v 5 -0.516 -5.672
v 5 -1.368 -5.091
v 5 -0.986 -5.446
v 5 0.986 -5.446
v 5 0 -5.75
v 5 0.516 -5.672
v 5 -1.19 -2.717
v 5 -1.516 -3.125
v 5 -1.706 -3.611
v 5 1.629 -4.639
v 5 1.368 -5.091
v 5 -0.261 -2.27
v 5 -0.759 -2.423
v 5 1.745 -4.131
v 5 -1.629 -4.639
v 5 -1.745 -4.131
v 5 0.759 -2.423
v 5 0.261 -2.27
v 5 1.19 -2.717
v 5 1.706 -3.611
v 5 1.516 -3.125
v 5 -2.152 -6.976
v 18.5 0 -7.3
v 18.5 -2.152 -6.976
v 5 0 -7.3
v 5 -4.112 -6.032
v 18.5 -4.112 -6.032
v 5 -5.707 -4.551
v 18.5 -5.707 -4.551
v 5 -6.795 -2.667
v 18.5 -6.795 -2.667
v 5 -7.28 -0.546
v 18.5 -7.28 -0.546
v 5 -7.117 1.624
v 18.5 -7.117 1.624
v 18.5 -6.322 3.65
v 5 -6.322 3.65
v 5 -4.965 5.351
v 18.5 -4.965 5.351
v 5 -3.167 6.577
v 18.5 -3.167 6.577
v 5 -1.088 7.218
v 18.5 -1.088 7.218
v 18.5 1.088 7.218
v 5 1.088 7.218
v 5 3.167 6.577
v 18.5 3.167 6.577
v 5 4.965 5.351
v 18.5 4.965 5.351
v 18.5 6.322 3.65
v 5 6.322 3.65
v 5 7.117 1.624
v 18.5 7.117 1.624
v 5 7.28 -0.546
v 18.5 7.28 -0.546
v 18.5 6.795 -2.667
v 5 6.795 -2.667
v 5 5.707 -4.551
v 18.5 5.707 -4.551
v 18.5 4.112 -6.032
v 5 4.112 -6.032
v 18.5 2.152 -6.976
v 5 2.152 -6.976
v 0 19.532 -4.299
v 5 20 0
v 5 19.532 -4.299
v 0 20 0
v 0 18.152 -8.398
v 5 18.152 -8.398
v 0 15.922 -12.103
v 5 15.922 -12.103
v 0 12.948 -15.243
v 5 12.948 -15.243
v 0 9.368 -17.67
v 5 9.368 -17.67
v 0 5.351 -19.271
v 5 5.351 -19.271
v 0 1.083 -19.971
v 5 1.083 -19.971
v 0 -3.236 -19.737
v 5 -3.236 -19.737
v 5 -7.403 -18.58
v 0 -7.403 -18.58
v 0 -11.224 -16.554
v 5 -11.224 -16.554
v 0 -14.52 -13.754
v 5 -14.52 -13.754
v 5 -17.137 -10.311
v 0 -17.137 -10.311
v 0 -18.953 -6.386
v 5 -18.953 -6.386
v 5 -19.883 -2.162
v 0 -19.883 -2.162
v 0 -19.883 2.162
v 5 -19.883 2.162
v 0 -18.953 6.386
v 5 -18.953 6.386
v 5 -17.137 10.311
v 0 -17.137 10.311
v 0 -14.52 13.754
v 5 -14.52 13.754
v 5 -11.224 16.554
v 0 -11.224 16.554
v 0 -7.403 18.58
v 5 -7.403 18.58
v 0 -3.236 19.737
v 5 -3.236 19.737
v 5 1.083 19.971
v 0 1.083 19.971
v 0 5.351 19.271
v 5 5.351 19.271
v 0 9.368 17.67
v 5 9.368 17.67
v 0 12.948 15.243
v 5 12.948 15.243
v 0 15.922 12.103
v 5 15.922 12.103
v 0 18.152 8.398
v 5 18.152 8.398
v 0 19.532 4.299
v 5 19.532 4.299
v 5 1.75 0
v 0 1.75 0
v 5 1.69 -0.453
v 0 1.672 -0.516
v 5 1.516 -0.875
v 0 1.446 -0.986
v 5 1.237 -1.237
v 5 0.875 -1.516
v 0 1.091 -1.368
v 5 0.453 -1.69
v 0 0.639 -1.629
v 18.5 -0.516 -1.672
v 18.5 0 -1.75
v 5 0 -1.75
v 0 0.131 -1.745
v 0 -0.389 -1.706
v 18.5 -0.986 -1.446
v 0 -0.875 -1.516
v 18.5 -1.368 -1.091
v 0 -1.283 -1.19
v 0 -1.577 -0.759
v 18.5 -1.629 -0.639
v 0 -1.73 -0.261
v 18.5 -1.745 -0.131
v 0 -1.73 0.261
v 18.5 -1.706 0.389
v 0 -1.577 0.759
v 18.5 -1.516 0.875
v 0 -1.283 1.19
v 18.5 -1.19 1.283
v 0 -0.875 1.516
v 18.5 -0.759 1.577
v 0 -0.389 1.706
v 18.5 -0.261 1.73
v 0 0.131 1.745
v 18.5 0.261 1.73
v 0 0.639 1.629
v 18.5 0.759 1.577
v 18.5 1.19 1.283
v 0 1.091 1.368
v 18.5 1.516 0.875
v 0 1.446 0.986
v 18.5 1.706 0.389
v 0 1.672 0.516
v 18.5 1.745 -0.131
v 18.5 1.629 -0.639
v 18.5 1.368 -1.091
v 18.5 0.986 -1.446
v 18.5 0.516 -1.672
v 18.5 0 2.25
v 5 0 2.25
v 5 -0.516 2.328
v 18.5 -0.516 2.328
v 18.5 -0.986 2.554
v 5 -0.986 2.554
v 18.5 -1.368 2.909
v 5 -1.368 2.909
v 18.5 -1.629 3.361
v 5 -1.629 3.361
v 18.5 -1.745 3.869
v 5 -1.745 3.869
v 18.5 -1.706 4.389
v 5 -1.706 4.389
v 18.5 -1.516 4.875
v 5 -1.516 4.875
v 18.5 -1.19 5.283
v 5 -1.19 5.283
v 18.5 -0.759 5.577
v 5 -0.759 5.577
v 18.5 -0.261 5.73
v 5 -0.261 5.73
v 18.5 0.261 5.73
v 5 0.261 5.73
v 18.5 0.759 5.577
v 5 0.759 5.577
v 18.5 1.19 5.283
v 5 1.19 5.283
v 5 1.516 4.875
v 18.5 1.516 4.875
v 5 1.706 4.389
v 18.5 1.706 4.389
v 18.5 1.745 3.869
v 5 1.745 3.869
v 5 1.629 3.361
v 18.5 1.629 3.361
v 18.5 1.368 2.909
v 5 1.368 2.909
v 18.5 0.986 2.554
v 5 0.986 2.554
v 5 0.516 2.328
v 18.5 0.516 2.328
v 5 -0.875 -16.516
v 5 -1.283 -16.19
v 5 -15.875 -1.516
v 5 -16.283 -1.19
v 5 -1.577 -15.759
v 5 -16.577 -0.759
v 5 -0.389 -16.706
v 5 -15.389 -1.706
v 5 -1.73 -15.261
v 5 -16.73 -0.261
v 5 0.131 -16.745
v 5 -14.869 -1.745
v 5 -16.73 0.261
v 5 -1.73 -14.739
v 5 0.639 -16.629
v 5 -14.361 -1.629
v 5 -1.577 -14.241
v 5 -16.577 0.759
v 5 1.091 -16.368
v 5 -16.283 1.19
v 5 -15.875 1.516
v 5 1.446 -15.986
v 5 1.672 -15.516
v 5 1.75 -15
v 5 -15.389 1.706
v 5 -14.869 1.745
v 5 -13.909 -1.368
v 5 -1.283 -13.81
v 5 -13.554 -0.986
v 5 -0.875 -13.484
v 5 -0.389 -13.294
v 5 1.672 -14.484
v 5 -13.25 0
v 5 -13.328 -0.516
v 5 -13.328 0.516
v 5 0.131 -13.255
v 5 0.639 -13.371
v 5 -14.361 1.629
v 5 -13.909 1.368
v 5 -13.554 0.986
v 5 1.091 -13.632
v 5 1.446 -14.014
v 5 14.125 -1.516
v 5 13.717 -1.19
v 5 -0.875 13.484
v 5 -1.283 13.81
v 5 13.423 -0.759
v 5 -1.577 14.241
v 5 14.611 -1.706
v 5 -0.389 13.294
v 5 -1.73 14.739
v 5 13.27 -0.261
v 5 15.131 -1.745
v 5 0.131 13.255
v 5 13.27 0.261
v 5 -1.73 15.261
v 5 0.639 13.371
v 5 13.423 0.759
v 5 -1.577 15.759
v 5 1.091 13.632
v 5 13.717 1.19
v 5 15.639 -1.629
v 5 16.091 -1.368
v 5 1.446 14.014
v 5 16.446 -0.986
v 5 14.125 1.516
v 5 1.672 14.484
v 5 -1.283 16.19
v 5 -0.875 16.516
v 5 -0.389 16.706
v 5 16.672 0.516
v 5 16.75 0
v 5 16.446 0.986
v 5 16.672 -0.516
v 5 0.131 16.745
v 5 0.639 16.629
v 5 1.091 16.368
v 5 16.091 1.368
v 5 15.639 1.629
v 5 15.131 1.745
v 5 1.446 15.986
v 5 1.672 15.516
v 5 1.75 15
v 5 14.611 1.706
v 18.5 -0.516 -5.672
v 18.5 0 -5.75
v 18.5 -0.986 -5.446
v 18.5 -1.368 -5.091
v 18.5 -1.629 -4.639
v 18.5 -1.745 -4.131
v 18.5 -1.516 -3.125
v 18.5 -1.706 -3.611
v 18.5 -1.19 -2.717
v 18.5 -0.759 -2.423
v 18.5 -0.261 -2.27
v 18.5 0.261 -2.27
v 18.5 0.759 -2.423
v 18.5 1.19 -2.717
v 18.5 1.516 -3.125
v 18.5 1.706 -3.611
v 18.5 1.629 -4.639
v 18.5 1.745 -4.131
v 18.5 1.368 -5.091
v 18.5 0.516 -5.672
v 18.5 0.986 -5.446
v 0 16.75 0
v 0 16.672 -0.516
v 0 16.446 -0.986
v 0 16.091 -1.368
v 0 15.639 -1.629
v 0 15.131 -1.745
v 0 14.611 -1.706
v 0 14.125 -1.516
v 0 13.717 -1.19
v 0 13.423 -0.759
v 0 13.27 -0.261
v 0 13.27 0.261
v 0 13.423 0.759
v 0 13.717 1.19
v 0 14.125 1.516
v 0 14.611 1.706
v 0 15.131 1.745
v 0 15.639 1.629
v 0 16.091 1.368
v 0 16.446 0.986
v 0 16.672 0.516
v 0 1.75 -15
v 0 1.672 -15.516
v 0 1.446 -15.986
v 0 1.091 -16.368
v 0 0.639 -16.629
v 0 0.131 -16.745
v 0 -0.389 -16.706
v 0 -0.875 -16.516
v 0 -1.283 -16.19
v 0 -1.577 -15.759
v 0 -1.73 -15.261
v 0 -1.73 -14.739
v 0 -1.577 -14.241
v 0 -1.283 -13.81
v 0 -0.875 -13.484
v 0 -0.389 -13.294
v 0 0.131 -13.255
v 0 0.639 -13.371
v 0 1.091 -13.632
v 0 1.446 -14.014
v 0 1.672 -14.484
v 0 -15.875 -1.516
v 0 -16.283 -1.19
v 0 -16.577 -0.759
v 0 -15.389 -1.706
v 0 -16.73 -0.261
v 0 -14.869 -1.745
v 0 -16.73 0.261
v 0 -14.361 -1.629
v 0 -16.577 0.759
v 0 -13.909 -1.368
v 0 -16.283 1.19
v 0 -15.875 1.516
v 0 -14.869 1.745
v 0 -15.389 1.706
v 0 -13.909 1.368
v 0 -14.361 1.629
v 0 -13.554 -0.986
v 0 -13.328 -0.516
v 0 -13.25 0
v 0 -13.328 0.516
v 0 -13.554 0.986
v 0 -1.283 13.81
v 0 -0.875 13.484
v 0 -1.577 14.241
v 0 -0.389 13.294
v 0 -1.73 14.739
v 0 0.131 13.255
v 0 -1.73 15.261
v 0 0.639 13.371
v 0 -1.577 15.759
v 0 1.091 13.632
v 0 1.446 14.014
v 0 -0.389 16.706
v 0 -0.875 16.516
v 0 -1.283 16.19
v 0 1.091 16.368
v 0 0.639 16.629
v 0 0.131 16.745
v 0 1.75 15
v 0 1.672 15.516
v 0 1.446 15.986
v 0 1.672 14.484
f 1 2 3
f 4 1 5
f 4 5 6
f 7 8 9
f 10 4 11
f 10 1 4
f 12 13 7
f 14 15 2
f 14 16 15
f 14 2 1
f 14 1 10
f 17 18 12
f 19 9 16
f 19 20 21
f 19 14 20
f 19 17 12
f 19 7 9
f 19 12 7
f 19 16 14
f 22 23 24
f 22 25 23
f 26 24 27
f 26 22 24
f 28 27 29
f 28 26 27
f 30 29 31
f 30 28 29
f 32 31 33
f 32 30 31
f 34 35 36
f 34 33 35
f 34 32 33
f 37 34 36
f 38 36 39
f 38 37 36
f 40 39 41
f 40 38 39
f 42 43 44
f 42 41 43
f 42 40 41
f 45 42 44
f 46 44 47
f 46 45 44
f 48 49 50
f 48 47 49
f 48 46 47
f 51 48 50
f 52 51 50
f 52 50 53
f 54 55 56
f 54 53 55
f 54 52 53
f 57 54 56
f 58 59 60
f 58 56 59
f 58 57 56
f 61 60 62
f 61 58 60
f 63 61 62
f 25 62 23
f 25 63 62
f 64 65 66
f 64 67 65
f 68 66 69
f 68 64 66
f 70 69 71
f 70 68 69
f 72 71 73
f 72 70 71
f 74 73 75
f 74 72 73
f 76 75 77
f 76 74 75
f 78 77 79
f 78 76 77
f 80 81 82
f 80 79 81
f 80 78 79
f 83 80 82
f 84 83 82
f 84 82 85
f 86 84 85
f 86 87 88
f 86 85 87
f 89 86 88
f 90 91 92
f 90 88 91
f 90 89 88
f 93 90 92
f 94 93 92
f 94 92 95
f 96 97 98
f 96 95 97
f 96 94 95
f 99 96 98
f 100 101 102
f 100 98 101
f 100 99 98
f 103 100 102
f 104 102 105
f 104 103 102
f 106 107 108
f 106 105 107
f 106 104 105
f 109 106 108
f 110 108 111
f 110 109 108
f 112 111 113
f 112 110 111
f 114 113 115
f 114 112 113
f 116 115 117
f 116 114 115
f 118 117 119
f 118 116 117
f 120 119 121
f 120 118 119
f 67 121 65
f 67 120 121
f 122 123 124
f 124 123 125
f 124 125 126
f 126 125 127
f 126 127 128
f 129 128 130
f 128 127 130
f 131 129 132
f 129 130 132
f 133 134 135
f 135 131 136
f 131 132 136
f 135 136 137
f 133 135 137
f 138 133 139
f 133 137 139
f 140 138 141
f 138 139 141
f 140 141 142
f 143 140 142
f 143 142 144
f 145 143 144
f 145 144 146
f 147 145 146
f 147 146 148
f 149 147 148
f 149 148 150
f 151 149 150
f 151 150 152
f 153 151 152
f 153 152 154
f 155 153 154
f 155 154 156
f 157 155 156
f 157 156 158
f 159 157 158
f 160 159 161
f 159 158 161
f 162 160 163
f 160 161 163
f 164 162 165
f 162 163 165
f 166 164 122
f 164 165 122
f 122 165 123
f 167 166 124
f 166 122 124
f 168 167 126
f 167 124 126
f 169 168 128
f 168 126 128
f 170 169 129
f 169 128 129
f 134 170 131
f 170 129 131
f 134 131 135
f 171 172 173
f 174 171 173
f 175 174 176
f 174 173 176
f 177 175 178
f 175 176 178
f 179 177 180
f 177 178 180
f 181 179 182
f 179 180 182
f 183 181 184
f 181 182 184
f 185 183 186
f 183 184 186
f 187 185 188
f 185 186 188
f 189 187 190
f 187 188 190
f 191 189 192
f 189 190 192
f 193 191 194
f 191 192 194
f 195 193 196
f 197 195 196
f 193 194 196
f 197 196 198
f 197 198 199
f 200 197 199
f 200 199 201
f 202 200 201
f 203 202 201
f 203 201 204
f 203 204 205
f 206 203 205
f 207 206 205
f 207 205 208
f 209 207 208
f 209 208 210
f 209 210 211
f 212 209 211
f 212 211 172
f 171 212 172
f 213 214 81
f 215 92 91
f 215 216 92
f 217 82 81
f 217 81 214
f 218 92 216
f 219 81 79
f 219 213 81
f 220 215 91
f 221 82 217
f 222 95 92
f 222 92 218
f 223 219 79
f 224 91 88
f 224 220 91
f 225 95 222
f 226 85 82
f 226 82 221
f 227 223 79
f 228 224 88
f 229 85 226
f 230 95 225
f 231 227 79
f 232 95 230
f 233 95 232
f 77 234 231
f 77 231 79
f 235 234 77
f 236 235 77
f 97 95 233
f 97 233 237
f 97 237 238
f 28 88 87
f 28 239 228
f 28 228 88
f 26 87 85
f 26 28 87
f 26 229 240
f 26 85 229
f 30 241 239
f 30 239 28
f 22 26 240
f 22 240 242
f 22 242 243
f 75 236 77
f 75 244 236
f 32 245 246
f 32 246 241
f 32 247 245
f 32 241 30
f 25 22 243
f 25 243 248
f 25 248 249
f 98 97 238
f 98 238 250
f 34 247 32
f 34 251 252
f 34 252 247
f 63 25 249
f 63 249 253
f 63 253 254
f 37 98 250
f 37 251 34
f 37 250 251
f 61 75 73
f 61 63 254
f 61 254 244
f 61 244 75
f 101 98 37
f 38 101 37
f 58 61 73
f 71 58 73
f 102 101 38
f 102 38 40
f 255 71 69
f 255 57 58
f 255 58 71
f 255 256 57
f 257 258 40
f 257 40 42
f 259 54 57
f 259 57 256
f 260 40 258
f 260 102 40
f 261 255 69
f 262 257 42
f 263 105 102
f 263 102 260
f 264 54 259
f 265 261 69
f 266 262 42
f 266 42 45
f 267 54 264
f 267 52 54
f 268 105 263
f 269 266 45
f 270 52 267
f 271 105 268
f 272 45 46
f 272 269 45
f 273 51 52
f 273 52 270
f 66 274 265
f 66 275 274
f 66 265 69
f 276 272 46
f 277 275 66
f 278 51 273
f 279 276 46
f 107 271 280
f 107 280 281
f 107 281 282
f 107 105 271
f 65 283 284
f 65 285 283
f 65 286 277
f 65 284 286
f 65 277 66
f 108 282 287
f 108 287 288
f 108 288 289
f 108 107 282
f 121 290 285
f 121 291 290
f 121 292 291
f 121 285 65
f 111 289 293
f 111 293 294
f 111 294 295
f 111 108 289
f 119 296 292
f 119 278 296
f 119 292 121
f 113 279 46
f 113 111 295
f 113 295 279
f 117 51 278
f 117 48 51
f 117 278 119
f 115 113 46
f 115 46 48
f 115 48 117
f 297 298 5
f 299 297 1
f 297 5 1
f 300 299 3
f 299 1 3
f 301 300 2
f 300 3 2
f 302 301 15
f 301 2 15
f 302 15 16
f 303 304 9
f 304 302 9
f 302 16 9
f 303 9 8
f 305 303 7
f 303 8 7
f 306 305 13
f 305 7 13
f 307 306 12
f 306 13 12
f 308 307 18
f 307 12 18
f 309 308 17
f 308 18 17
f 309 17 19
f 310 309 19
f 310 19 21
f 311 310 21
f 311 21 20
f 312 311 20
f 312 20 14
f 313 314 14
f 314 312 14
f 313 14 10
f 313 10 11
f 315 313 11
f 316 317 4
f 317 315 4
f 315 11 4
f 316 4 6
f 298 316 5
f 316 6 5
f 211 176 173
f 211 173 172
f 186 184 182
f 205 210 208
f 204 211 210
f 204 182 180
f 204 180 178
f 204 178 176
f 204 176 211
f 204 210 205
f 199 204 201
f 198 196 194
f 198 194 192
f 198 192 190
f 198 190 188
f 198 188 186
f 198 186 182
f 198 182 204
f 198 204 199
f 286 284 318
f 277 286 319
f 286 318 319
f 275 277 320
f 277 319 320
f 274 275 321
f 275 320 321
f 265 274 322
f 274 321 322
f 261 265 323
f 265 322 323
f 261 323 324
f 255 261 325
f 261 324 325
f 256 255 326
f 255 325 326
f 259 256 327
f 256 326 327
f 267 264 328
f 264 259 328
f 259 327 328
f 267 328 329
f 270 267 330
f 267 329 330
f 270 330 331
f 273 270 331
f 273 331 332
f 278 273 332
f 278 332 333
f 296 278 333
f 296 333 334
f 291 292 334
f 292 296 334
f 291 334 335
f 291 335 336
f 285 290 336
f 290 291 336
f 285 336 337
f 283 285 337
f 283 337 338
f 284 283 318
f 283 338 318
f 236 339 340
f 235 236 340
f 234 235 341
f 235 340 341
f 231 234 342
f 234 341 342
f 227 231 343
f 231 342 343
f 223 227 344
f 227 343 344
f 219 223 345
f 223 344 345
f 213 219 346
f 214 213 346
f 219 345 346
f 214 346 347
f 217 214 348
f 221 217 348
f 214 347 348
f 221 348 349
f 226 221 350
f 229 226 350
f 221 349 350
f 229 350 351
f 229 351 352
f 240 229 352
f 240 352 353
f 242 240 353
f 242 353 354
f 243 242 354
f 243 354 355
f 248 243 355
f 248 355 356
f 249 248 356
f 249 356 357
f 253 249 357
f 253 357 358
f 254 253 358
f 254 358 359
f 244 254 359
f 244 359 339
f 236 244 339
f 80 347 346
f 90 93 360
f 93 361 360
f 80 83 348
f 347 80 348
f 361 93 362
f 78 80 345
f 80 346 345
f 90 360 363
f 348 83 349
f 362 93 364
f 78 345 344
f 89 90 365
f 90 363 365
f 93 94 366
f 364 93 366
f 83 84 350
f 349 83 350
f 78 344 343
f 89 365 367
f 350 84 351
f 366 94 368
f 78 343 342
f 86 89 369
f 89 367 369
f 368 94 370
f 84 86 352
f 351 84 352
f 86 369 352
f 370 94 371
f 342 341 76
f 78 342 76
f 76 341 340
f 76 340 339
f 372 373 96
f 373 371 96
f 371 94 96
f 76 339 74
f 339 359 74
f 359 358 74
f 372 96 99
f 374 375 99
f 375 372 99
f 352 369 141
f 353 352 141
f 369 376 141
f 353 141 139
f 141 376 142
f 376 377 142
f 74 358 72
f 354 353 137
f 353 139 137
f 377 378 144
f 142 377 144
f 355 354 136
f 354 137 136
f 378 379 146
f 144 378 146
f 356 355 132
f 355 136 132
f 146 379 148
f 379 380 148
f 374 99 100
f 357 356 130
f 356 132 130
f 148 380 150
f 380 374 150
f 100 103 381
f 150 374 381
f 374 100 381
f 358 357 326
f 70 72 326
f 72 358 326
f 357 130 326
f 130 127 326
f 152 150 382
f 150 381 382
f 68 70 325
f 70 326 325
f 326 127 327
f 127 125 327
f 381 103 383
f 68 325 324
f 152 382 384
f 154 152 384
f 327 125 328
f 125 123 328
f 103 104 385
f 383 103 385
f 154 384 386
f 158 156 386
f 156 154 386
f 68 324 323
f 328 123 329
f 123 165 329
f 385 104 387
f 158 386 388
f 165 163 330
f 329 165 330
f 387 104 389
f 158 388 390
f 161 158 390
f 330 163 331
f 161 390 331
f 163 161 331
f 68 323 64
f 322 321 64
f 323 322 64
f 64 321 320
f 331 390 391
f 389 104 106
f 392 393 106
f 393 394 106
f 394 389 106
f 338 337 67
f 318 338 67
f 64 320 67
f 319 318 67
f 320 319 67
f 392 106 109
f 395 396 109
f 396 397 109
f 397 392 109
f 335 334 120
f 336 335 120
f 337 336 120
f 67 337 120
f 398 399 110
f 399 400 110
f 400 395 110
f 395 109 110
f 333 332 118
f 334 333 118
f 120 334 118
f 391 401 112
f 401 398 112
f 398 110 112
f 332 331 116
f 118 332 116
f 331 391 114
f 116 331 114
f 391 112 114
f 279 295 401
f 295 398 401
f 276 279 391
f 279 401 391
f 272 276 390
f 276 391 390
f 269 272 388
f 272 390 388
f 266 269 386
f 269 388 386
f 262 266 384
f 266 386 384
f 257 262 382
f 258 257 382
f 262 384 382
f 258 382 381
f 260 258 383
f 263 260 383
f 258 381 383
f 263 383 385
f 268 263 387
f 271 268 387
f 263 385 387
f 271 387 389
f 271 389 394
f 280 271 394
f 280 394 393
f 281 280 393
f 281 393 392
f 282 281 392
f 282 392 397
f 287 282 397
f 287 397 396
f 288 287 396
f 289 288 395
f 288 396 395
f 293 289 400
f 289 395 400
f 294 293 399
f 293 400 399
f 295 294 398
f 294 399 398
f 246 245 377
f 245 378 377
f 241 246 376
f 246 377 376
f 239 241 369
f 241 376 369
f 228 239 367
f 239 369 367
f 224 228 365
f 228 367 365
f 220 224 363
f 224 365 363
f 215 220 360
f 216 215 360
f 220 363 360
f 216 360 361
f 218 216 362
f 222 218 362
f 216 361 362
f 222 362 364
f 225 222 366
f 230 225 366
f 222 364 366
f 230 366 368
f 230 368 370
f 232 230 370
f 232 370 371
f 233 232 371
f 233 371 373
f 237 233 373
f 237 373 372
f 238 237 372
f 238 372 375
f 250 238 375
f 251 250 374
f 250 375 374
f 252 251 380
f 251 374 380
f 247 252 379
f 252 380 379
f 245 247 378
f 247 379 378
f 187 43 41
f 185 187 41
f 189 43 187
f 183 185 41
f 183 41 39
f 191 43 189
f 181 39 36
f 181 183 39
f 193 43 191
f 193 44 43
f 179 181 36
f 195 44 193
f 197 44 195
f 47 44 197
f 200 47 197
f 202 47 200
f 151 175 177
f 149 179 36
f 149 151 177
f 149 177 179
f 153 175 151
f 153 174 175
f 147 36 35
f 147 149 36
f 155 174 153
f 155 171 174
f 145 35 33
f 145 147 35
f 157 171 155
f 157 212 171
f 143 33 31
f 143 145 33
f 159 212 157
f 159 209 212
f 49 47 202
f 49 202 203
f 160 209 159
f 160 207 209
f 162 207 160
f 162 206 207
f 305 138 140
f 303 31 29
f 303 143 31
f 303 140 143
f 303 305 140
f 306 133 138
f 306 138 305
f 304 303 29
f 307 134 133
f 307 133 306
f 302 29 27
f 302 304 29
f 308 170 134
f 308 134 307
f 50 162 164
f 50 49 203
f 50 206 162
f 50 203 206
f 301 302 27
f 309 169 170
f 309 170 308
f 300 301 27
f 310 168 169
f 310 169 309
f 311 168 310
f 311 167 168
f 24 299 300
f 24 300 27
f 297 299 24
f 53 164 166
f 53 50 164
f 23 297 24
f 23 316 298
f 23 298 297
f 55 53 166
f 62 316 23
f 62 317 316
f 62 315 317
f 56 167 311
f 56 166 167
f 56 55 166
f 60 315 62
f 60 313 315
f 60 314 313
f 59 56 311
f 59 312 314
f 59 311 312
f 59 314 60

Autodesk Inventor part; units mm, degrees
ref_plane "YZ Plane" through (0, 0, 0) normal (1, 0, 0) x (0, 1, 0)
ref_plane "XZ Plane" through (0, 0, 0) normal (0, 1, 0) x (-1, 0, 0)
ref_plane "XY Plane" through (0, 0, 0) normal (0, 0, 1) x (1, 0, 0)
sketch "Sketch1" plane through (0, 0, 0) normal (1, 0, 0) x (0, 1, 0)
  circle A0 centre (0, 0) radius 15
  circle A1 centre (15, 0) radius 1.75
  circle A2 centre (0, 15) radius 1.75
  circle A3 centre (-15, 0) radius 1.75
  circle A4 centre (0, -15) radius 1.75
  circle A5 centre (0, 0) radius 1.75
  circle A6 centre (0, 0) radius 20
  dimension "d0" = 30
  dimension "d1" = 3.5
  dimension "d4" = 360
  dimension "d6" = 3.5
  dimension "d7" = 40
extrude "Extrusion1" add sketch "Sketch1" along normal blind 5 contours A1 A0 A4 A3 A2 | A6
sketch "Sketch5" plane through (5, 0, 0) normal (1, 0, 0) x (0, 0, -1)
  circle A0 centre (0, 0) radius 1.75 projected
  circle A1 centre (0, 0) radius 4
  circle A2 centre (4, 0) radius 1.75
  circle A3 centre (-4, 0) radius 1.75
  circle A4 centre (0, 0) radius 7.3
  dimension "d38" = 8
  dimension "d39" = 3.5
  dimension "d42" = 360
  dimension "d44" = 14.6
extrude "Extrusion5" add sketch "Sketch5" along normal blind 13.5 contours A2 A1 A3 | A4
equation "\"BendRadius\" = Thickness"
equation "\"BendReliefWidth\" = Thickness"
equation "\"BendReliefDepth\" = 0.5 * Thickness"
equation "\"CornerReliefSize\" = 4 * Thickness"
equation "\"MinimumRemnant\" = 2 * Thickness"
equation "\"TransitionRadius\" = BendRadius"
equation "\"JacobiRadiusSize\" = BendRadius"
equation "\"GapSize\" = Thickness"
equation "\"Thickness\" = 0.5"
properties part number "EaglePowerCycDriveAdaptor"
